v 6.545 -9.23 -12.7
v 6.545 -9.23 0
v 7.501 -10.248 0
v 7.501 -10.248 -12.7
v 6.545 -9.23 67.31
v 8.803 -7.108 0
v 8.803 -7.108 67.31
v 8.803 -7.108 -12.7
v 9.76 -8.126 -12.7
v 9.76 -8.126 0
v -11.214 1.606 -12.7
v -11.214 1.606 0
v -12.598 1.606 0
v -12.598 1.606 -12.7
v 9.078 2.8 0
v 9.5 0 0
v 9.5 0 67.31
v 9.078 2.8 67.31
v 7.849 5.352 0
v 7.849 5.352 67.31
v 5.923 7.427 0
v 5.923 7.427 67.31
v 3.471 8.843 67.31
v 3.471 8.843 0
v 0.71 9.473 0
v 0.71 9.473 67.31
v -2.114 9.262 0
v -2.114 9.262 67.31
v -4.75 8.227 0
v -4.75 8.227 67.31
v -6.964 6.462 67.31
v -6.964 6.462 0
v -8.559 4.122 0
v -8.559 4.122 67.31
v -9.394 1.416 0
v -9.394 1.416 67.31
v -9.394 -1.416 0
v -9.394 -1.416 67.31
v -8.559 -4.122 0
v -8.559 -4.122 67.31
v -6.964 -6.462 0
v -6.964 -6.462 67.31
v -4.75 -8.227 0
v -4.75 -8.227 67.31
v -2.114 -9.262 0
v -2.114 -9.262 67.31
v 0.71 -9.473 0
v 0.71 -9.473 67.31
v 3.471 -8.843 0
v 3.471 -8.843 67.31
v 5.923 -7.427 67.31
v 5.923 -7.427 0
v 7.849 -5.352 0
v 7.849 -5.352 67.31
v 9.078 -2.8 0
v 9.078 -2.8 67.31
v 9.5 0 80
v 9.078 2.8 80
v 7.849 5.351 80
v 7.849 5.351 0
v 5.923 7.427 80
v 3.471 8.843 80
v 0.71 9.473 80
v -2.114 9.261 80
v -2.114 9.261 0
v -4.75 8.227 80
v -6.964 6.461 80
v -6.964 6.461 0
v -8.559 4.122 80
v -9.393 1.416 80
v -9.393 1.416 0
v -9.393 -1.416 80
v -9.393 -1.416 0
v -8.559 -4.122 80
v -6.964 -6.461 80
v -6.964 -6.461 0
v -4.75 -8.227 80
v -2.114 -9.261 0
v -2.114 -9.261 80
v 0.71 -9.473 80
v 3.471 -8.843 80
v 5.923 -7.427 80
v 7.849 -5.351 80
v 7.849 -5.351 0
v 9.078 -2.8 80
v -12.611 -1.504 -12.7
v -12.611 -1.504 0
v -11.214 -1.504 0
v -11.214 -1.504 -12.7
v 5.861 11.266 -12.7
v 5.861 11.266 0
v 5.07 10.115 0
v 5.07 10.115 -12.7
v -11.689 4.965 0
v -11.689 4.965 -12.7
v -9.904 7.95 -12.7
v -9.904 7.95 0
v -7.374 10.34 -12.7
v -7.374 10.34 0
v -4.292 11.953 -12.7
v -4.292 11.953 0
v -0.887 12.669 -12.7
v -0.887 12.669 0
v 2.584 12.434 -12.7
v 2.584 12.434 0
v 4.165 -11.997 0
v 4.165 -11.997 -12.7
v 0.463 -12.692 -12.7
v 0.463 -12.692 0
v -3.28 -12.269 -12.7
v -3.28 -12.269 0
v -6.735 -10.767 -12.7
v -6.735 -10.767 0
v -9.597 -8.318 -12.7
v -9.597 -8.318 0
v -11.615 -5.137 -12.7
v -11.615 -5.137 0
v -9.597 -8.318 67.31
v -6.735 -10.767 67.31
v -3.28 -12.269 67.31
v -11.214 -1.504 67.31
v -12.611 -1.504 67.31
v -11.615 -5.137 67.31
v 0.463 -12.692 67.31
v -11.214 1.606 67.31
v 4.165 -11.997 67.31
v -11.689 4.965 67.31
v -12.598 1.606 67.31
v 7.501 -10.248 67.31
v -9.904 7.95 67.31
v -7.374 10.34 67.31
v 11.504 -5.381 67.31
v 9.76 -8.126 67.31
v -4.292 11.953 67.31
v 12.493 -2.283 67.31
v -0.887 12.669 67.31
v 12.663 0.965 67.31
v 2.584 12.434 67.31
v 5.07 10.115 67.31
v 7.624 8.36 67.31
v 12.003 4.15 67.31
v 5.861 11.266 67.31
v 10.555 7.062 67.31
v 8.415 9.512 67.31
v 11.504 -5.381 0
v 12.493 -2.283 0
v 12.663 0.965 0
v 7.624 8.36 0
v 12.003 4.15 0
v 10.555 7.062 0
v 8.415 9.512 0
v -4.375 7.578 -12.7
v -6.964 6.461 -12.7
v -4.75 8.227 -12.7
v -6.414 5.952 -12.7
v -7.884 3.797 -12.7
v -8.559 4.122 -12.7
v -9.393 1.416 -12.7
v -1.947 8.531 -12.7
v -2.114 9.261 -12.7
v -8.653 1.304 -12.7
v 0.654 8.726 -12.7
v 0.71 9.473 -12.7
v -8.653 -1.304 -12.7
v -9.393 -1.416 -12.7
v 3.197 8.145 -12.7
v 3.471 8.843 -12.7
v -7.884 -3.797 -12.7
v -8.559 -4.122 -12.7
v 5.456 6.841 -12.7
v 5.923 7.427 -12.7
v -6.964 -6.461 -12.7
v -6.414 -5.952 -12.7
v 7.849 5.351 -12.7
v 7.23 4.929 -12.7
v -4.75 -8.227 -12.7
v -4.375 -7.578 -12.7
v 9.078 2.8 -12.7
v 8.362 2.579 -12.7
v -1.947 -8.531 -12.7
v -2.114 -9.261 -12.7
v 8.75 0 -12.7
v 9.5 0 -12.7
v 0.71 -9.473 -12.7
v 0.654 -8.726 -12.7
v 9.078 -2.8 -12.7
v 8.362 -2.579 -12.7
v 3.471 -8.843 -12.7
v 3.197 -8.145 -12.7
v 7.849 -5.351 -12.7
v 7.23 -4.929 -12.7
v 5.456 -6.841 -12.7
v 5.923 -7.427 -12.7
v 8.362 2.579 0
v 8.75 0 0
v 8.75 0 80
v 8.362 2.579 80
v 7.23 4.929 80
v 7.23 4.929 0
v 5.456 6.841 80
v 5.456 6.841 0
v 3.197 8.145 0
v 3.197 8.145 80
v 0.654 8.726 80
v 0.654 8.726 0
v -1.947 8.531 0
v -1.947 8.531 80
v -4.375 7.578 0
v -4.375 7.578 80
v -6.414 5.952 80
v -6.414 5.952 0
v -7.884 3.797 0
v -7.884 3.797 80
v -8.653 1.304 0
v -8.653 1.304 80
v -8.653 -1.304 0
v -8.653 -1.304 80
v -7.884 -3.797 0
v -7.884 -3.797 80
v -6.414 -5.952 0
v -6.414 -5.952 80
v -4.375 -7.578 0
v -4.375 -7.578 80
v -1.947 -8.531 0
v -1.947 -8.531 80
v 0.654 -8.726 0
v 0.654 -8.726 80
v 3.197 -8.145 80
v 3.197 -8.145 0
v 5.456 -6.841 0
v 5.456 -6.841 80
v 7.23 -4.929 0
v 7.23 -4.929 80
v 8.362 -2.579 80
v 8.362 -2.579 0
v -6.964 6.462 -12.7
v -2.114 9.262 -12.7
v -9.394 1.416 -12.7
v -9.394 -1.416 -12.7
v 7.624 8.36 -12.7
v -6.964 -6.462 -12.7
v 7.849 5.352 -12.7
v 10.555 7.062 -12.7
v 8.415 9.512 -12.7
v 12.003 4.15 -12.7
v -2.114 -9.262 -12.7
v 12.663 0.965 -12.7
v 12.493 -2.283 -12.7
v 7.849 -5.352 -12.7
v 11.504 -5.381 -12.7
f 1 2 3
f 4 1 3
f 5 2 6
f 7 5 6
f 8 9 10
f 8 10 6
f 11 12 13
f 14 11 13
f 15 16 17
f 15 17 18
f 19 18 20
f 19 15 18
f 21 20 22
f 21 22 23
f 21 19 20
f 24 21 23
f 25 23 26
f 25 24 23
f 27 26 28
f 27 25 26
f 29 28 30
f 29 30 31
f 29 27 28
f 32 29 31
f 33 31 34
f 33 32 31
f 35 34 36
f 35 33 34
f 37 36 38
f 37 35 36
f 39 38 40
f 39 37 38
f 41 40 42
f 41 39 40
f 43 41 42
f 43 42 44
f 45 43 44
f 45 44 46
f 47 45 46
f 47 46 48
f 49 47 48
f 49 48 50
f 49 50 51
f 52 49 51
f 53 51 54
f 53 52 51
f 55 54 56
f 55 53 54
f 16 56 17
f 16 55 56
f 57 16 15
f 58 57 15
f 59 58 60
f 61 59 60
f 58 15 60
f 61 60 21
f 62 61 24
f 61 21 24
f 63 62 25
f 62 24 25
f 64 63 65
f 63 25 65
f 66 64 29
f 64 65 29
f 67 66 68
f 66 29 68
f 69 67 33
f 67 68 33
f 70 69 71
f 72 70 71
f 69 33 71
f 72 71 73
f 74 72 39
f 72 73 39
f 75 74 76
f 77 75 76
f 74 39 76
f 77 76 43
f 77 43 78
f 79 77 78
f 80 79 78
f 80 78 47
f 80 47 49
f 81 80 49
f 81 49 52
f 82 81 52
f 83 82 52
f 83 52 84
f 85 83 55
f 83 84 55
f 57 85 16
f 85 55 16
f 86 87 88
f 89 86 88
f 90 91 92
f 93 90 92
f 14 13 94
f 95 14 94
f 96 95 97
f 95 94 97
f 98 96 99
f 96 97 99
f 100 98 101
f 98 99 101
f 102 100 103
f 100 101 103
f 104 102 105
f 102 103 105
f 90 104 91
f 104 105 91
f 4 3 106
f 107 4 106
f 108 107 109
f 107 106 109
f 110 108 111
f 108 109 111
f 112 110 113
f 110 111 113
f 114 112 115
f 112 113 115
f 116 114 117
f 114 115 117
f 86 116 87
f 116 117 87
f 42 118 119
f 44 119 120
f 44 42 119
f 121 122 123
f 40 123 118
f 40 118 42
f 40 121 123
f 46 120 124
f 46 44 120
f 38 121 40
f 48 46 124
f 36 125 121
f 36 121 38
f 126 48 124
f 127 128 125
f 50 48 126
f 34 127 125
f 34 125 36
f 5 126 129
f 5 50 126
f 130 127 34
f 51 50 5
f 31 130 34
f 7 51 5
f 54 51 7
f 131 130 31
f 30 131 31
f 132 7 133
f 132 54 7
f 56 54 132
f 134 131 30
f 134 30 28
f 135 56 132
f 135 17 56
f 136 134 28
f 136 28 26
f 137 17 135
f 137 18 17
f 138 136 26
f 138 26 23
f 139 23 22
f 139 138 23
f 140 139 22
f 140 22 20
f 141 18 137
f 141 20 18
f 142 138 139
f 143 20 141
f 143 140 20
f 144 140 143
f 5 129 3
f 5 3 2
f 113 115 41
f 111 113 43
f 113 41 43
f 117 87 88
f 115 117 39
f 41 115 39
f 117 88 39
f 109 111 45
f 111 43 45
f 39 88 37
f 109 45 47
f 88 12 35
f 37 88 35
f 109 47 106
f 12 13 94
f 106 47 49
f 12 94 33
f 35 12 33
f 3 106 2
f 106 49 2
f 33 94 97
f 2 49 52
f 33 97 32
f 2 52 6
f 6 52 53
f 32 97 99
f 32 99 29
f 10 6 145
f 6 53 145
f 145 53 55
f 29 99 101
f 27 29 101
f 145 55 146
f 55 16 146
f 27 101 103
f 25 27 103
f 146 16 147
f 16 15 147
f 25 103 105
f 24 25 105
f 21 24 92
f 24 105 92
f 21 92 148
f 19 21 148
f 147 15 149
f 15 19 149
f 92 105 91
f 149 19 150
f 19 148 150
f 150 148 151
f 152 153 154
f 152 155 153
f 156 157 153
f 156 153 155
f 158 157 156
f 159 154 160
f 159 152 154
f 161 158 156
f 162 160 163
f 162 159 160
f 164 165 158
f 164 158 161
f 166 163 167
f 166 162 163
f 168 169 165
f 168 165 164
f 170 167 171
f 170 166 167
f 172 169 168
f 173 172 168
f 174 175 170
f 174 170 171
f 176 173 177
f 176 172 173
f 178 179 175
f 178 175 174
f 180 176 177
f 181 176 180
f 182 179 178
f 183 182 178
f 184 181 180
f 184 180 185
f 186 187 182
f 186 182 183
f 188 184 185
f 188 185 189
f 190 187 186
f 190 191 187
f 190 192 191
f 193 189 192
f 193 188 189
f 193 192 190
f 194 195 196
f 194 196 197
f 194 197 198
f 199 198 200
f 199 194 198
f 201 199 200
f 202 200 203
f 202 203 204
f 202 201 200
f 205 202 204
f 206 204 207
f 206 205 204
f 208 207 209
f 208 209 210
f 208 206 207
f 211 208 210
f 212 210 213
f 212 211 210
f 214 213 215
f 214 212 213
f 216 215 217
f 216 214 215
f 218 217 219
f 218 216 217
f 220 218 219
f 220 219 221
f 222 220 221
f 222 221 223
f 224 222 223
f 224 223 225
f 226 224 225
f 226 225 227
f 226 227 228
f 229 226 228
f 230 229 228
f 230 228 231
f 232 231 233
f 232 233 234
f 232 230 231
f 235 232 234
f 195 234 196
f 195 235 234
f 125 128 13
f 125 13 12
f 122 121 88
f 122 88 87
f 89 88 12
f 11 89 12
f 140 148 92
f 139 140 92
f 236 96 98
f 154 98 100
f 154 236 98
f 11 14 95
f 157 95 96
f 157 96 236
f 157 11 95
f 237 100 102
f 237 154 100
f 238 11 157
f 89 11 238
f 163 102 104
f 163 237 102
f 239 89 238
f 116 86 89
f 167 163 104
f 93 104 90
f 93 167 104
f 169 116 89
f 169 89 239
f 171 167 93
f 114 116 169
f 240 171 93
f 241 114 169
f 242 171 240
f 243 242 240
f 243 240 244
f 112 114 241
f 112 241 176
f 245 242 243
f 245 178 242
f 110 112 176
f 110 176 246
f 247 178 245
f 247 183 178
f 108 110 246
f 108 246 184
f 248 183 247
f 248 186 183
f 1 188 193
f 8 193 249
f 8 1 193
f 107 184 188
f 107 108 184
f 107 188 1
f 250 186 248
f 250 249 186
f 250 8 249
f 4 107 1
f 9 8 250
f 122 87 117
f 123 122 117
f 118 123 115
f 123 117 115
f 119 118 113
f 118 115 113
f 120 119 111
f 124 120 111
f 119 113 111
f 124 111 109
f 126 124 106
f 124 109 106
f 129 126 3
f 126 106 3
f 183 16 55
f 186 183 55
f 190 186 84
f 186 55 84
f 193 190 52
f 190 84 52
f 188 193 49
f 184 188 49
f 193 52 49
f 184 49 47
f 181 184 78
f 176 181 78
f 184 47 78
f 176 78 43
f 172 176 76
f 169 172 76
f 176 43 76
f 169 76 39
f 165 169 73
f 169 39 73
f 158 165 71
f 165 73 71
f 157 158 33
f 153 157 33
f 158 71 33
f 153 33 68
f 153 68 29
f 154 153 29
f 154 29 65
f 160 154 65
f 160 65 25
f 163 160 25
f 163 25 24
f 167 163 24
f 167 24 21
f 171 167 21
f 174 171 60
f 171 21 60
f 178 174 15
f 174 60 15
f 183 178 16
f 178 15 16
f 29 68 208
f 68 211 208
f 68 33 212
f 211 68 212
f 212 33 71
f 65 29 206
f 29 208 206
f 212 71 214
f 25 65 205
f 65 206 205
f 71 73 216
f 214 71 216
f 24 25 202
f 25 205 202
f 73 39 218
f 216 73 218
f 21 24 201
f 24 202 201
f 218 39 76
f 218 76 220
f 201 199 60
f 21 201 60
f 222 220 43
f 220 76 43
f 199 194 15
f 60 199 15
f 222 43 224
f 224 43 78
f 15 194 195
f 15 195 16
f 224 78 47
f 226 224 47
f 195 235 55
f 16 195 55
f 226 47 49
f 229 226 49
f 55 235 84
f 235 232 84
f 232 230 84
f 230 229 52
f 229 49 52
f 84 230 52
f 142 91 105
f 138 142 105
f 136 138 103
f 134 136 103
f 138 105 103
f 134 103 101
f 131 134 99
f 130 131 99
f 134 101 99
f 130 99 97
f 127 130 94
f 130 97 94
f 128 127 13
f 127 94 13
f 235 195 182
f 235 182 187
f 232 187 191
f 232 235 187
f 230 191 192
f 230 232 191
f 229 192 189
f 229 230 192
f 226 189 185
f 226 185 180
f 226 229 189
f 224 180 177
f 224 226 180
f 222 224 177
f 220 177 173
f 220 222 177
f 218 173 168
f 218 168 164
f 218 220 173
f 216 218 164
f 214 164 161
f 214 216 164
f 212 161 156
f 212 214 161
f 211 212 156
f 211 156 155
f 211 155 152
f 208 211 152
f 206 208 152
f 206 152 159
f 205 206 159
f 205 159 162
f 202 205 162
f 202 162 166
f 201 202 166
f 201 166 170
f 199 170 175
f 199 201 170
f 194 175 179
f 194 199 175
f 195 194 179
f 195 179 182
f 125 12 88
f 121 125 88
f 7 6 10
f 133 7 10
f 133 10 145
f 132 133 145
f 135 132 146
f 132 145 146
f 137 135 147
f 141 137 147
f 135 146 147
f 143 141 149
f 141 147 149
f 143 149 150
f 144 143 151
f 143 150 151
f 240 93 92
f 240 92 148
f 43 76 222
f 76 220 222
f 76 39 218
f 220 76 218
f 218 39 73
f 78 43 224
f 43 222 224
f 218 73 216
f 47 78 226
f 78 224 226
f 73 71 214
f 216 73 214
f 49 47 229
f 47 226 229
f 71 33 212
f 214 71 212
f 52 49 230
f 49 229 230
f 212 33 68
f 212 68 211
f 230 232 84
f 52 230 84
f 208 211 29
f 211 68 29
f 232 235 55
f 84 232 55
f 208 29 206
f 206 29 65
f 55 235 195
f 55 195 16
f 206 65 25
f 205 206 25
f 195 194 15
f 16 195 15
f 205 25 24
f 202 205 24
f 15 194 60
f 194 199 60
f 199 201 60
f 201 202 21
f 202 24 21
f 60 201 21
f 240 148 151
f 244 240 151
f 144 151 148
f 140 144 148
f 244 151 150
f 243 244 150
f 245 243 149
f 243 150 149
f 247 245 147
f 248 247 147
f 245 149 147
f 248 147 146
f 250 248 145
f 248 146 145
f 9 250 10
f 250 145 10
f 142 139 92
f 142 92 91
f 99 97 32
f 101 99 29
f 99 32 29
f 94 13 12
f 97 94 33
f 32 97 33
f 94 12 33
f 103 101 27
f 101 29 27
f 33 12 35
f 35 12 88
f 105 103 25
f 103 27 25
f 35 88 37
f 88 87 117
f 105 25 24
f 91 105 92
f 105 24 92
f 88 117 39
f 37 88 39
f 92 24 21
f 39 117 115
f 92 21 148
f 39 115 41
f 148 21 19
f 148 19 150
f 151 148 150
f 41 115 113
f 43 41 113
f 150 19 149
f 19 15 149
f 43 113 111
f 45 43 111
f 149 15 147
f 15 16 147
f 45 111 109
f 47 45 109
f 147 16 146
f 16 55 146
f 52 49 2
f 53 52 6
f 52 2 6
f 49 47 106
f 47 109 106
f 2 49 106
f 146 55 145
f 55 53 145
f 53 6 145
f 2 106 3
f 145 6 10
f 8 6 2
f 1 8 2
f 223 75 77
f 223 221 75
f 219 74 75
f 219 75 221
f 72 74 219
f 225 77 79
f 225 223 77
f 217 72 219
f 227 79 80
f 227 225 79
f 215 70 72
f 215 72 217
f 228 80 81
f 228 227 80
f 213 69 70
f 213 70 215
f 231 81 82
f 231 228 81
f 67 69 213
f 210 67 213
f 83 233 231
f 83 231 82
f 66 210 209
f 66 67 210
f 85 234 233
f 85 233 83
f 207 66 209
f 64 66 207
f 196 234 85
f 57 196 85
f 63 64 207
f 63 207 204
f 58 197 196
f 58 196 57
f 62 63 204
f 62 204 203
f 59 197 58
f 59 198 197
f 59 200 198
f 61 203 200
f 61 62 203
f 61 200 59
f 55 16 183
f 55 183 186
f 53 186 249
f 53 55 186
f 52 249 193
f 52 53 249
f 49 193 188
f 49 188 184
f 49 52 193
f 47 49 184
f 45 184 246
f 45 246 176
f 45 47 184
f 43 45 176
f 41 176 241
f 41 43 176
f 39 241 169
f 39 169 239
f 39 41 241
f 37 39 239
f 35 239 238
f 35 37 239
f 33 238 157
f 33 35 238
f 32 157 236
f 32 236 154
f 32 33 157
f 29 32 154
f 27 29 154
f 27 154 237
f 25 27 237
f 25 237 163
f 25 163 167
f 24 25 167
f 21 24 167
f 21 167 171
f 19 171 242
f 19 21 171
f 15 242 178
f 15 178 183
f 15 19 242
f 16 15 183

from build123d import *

# Parameters (mm, degrees)
F0_R        = 9.5
F1_DEPTH    = 67.31
F2_R        = 9.4996
F2_R_2      = 8.7503
F3_DEPTH    = 80
F3_FACE_R   = 9.4996
F3_FACE_R_2 = 8.7503
F1_FACE_R   = 9.5
F4_DEPTH    = 12.7


with BuildPart() as f1:
    # F0 (on Top) → F1 (new body)
    with BuildSketch(Plane.XY):
        with BuildLine():
            Line((8.803368, -7.107994), (9.759883, -8.126173))
            ThreePointArc((9.759883, -8.126173), (12.663265, 0.965262), (8.415437, 9.511594))
            Line((8.415437, 9.511594), (7.624299, 8.360199))
            Line((7.624299, 8.360199), (5.070296, 10.115086))
            Line((5.070296, 10.115086), (5.861433, 11.266481))
            ThreePointArc((5.861433, 11.266481), (-5.888662, 11.252274), (-12.598037, 1.606072))
            Line((-12.598037, 1.606072), (-11.213638, 1.606072))
            Line((-11.213638, 1.606072), (-11.213638, -1.503928))
            Line((-11.213638, -1.503928), (-12.610638, -1.503928))
            ThreePointArc((-12.610638, -1.503928), (-5.063634, -11.646871), (7.501375, -10.247896))
            Line((7.501375, -10.247896), (6.544861, -9.229716))
            Line((6.544861, -9.229716), (8.803368, -7.107994))
        make_face()
        Circle(F0_R, mode=Mode.SUBTRACT)
    extrude(amount=F1_DEPTH)


with BuildPart() as f3:
    # F2 (on Top) → F3 (new body)
    with BuildSketch(Plane.XY):
        Circle(F2_R)
        Circle(F2_R_2, mode=Mode.SUBTRACT)
    extrude(amount=F3_DEPTH)


with BuildPart() as f4:
    # F3_face (on face) + F1_face (on face) → F4 (new body)
    with BuildSketch(Plane(origin=(0, 0, 0), x_dir=(1, 0, 0), z_dir=(0, 0, -1))):
        Circle(F3_FACE_R)
        Circle(F3_FACE_R_2, mode=Mode.SUBTRACT)
    with BuildSketch(Plane(origin=(-0.064741, -0.025632, 0), x_dir=(1, 0, 0), z_dir=(0, 0, -1))):
        with BuildLine():
            ThreePointArc((7.566116, 10.222264), (-4.998893, 11.62124), (-12.545898, 1.478297))
            Line((-12.545898, 1.478297), (-11.148898, 1.478297))
            Line((-11.148898, 1.478297), (-11.148898, -1.631703))
            Line((-11.148898, -1.631703), (-12.533296, -1.631703))
            ThreePointArc((-12.533296, -1.631703), (-5.823921, -11.277905), (5.926174, -11.292113))
            Line((5.926174, -11.292113), (5.135036, -10.140718))
            Line((5.135036, -10.140718), (7.68904, -8.385831))
            Line((7.68904, -8.385831), (8.480177, -9.537226))
            ThreePointArc((8.480177, -9.537226), (12.728005, -0.990894), (9.824623, 8.100542))
            Line((9.824623, 8.100542), (8.868109, 7.082362))
            Line((8.868109, 7.082362), (6.609602, 9.204085))
            Line((6.609602, 9.204085), (7.566116, 10.222264))
        make_face()
        with Locations((0.064741, -0.025632)):
            Circle(F1_FACE_R, mode=Mode.SUBTRACT)
    extrude(amount=F4_DEPTH)


solid = Compound([f1.part, f3.part, f4.part])
